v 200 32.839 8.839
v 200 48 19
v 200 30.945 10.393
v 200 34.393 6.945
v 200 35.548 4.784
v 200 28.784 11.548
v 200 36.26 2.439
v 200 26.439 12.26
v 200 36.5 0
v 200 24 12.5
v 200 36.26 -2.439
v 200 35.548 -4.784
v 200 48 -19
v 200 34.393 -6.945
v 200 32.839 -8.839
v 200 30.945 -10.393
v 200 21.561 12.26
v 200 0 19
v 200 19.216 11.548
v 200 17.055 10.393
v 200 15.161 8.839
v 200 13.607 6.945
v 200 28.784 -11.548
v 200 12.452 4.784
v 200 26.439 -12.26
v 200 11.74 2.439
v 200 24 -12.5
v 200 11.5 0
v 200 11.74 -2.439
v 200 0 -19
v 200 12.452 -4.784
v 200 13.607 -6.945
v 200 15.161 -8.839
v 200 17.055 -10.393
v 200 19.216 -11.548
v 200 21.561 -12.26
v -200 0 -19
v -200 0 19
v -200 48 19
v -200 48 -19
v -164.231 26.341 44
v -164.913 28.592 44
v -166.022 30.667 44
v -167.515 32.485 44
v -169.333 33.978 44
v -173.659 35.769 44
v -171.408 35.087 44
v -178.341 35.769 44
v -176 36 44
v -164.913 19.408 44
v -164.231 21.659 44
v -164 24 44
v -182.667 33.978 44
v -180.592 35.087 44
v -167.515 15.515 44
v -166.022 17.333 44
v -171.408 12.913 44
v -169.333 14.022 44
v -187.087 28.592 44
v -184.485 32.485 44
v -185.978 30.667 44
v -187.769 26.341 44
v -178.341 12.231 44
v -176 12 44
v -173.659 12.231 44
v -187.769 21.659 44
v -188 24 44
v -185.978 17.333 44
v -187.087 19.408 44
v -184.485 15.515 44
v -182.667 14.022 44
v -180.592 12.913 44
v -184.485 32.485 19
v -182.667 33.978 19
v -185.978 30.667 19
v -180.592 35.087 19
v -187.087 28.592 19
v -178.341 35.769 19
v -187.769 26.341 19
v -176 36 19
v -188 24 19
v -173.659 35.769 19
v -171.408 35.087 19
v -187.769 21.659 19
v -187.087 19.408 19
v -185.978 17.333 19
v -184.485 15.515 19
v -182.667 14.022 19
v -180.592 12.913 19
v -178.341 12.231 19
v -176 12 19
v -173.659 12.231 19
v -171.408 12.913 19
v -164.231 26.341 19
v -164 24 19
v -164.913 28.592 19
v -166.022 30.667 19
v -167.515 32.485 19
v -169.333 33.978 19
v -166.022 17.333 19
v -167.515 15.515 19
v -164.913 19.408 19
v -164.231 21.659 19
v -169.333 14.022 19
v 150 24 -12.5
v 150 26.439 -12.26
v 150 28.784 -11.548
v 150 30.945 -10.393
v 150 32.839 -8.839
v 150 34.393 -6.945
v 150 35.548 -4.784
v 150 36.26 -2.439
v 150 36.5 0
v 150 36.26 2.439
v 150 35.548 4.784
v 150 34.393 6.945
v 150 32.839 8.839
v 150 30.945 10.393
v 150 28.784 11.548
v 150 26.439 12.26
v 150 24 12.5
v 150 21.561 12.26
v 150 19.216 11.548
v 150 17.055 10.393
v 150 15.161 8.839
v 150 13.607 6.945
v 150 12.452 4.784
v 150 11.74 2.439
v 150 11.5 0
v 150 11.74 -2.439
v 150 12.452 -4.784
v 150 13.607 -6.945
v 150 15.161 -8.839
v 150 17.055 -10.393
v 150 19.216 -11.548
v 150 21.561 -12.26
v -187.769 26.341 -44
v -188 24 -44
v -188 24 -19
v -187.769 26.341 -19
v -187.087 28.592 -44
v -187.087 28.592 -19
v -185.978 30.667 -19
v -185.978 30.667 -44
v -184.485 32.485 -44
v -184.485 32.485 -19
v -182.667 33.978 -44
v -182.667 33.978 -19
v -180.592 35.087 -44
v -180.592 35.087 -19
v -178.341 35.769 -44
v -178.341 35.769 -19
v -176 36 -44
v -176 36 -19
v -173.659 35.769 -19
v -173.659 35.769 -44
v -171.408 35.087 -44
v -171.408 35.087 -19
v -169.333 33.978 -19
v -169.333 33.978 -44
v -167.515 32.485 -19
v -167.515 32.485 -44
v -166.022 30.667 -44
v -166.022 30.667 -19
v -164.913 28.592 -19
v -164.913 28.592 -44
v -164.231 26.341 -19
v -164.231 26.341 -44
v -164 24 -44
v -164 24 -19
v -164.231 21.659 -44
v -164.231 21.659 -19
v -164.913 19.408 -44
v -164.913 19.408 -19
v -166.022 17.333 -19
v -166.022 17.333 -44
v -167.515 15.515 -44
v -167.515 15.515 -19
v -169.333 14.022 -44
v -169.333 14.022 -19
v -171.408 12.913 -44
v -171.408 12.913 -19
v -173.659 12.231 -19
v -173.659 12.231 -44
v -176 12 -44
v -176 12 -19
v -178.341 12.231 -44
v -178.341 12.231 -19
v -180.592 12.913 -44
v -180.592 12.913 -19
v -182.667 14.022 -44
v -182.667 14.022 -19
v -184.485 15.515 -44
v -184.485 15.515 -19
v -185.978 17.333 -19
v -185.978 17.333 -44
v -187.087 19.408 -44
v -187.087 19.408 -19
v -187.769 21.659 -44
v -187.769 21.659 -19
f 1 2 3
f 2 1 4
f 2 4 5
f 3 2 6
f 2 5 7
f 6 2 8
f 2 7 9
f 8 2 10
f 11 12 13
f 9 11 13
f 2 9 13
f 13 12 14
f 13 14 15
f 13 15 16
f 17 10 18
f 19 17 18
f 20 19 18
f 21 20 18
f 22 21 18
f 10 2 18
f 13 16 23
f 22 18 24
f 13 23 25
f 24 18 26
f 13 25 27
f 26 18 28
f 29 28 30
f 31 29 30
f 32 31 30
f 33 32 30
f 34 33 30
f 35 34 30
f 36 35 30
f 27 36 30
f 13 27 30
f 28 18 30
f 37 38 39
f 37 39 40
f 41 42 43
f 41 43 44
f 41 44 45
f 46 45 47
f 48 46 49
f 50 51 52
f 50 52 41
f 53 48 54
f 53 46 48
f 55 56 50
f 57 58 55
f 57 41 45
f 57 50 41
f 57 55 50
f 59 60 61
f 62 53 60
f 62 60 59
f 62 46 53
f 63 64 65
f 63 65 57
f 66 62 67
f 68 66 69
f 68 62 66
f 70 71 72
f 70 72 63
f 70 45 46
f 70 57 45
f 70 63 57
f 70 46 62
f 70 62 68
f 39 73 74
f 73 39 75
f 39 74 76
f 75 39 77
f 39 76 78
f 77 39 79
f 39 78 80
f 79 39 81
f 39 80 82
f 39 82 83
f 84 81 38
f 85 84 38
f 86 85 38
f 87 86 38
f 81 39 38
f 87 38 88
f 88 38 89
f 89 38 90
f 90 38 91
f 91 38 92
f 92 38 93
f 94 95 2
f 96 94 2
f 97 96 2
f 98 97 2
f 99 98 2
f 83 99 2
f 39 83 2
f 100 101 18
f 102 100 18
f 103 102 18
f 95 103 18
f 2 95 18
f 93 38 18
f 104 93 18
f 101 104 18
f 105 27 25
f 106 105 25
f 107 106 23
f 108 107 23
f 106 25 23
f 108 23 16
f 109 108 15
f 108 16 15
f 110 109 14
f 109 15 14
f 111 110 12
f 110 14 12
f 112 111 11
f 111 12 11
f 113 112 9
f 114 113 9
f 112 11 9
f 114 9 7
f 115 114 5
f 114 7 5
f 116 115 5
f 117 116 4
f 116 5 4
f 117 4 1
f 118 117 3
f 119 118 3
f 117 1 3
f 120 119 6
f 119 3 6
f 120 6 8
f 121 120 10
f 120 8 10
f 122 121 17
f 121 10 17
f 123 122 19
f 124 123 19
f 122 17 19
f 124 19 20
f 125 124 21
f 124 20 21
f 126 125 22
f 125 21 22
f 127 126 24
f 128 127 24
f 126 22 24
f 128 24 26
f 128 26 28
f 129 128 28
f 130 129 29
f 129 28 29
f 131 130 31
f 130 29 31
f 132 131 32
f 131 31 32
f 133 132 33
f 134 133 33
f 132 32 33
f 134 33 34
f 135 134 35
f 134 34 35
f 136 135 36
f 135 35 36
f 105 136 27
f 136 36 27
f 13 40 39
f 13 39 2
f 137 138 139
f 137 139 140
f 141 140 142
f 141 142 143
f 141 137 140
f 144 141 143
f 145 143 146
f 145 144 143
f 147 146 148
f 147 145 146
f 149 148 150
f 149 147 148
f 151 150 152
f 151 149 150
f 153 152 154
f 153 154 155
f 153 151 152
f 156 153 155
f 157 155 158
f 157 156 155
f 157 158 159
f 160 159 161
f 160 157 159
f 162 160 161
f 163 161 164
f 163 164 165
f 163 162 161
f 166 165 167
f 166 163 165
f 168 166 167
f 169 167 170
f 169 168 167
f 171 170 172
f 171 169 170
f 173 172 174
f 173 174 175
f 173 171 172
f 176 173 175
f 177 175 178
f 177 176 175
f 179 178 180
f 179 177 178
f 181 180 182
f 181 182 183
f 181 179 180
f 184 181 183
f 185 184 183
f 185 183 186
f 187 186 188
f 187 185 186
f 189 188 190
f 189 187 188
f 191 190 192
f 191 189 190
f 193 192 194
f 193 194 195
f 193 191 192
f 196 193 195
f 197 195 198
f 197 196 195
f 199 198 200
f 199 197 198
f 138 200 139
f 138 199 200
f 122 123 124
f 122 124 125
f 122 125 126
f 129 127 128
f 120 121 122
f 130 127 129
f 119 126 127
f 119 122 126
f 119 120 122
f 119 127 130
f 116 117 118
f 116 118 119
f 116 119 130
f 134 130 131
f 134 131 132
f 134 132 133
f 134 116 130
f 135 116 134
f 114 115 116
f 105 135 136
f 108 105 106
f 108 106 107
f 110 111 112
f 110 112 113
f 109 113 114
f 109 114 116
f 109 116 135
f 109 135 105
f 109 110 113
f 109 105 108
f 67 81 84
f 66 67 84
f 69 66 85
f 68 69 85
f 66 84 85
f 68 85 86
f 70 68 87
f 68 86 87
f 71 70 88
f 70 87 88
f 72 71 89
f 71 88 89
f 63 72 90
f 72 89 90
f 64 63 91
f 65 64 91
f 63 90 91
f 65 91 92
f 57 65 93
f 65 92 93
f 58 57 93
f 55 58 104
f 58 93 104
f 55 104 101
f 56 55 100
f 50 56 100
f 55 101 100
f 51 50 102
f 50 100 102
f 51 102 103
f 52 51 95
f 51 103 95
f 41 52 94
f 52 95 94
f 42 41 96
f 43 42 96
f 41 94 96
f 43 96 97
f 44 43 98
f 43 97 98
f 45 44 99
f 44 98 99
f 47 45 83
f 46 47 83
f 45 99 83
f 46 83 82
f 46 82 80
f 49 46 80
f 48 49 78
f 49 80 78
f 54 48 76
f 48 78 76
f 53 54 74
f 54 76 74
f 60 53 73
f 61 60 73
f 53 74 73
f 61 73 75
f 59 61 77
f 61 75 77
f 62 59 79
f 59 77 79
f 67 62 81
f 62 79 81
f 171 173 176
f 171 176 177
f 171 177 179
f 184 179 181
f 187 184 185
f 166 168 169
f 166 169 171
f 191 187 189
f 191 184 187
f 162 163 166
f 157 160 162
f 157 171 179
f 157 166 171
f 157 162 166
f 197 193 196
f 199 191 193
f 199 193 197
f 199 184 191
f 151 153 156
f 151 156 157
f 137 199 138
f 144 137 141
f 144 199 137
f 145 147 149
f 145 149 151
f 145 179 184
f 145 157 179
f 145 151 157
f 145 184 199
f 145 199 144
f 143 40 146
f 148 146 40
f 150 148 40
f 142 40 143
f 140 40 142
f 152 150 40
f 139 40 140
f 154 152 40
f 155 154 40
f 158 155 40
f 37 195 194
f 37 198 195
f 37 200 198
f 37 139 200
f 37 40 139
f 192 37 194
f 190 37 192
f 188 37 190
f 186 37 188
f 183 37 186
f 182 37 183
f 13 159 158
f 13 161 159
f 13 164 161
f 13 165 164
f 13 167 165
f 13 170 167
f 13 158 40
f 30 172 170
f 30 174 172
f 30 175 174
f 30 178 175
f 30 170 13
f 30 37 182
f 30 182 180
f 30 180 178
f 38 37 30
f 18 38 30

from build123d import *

# Parameters (mm, degrees)
SKETCH1_W           = 400
SKETCH1_H           = 38
BOSS_EXTRUDE1_DEPTH = 48
SKETCH2_R           = 12
BOSS_EXTRUDE2_DEPTH = 25
BOSS_EXTRUDE3_START = 25
SKETCH3_R           = 12
BOSS_EXTRUDE3_DEPTH = 25
SKETCH6_R           = 12.5
CUT_EXTRUDE1_DEPTH  = 50


with BuildPart() as part:
    # Sketch1 → Boss-Extrude1 (new body)
    with BuildSketch(Plane(origin=(0, 0, 0), x_dir=(1, 0, 0), z_dir=(0, 1, 0))):
        Rectangle(SKETCH1_W, SKETCH1_H)
    extrude(amount=BOSS_EXTRUDE1_DEPTH)

    # Sketch2 → Boss-Extrude2 (add)
    with BuildSketch(Plane.XY.offset(19)):
        with Locations(Location((-176, 24, 0), (0, 0, 180))):
            Circle(SKETCH2_R)
    extrude(amount=BOSS_EXTRUDE2_DEPTH)

    # Sketch3 → Boss-Extrude3 (add)
    with BuildSketch(Plane(origin=(0, 0, -19), x_dir=(-1, 0, 0), z_dir=(0, 0, -1)).offset(BOSS_EXTRUDE3_START)):
        with Locations((176, 24)):
            Circle(SKETCH3_R)
    extrude(amount=-BOSS_EXTRUDE3_DEPTH)

    # Sketch6 → Cut-Extrude1 (cut)
    with BuildSketch(Plane(origin=(200, 0, 0), x_dir=(0, 0, -1), z_dir=(1, 0, 0))):
        with Locations((0, 24)):
            Circle(SKETCH6_R)
    extrude(amount=-CUT_EXTRUDE1_DEPTH, mode=Mode.SUBTRACT)


solid = part.part
